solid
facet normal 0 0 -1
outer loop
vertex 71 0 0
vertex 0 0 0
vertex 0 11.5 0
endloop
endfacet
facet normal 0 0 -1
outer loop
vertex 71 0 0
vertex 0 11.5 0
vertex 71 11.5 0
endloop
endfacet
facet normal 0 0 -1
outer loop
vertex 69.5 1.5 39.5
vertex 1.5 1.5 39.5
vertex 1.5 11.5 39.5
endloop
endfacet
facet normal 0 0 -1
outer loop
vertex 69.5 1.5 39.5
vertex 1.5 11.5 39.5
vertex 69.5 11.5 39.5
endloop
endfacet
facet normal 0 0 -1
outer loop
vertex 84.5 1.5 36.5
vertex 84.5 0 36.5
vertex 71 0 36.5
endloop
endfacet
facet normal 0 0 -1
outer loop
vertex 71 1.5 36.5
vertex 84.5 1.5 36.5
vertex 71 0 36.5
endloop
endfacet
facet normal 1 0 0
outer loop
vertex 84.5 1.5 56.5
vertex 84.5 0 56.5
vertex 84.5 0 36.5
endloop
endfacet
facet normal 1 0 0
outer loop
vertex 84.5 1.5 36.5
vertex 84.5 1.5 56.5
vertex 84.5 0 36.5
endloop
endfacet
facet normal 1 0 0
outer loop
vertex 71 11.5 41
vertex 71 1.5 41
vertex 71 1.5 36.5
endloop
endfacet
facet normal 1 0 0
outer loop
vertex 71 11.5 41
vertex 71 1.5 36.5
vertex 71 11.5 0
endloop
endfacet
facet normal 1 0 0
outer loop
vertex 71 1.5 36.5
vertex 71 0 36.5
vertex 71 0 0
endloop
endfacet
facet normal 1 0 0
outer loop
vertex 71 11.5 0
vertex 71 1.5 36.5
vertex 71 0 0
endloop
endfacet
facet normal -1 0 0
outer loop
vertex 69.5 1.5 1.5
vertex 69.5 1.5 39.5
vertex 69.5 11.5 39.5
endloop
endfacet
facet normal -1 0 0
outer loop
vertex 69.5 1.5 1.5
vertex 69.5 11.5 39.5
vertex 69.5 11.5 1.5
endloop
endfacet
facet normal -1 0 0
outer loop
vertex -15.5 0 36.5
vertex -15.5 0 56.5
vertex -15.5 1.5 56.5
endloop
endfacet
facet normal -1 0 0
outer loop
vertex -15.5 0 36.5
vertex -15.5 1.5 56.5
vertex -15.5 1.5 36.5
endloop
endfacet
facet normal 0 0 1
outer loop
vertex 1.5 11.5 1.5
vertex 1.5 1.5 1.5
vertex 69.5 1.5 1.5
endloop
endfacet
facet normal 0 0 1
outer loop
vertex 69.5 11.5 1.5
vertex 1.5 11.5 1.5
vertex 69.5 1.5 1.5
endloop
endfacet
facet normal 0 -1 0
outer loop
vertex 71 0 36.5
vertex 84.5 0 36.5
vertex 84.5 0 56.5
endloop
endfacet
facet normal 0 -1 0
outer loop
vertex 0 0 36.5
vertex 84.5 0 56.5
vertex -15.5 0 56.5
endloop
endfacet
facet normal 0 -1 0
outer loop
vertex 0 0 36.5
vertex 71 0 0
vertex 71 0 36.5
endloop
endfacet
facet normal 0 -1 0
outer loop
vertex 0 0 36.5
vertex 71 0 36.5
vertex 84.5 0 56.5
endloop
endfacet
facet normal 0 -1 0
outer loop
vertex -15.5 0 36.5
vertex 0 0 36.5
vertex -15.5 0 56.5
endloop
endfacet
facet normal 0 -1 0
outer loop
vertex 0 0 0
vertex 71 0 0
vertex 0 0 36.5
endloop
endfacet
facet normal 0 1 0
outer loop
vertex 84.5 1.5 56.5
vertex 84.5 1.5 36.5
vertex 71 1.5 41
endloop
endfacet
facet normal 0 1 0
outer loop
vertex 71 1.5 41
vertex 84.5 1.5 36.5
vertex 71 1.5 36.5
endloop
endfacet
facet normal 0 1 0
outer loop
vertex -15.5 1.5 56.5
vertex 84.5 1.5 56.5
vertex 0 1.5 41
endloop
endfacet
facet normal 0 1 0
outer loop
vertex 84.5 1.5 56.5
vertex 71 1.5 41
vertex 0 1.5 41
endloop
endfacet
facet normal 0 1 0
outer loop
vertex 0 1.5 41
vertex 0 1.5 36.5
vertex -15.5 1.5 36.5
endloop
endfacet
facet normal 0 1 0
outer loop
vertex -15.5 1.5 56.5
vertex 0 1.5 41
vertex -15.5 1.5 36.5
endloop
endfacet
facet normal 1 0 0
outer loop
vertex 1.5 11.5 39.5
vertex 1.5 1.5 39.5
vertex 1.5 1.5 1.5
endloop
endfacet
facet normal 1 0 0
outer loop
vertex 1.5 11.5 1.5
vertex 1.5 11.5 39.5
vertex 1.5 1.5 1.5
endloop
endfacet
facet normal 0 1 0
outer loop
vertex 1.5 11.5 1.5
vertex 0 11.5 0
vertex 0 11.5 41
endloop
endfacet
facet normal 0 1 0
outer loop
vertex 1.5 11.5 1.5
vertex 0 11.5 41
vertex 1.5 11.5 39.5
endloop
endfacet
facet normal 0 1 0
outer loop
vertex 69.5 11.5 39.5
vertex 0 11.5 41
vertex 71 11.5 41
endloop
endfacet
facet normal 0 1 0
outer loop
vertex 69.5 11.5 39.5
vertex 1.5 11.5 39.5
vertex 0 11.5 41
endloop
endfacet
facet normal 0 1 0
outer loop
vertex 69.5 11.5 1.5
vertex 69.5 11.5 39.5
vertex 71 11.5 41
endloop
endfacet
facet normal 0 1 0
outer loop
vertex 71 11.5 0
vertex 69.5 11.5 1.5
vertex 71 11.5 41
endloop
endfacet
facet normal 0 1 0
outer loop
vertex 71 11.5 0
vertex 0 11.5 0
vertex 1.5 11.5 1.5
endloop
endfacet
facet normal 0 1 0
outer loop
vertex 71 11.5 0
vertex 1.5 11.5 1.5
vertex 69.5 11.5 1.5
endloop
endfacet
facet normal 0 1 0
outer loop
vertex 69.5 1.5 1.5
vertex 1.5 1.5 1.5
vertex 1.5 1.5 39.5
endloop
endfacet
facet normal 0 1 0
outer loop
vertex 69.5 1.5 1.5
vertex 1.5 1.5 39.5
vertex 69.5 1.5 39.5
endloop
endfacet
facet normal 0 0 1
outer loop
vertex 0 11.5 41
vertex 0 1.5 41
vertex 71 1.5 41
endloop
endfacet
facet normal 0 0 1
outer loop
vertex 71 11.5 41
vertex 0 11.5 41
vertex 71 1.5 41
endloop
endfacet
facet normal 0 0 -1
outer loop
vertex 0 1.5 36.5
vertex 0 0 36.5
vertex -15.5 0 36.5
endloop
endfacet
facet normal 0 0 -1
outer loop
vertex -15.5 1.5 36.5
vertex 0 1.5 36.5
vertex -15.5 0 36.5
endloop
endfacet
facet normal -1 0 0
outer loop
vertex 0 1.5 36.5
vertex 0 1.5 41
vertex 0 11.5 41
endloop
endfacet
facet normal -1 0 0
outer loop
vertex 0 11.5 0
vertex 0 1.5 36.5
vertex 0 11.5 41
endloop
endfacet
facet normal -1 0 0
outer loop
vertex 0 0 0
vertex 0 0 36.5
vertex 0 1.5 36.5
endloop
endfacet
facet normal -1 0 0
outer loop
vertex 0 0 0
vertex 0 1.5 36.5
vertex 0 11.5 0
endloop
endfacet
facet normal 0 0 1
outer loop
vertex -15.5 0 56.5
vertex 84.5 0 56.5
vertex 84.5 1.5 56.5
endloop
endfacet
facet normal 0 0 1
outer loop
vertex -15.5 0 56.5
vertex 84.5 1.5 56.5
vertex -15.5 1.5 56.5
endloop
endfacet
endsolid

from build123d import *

# Parameters (mm, degrees)
SKETCH_1_W      = 71
SKETCH_1_H      = 41
EXTRUDE_1_DEPTH = 1.5
SKETCH_2_W      = 71
SKETCH_2_H      = 41
SKETCH_2_W_2    = 68
SKETCH_2_H_2    = 38
EXTRUDE_2_DEPTH = 10
SKETCH_3_W      = 100
SKETCH_3_H      = 20
EXTRUDE_3_DEPTH = 1.5


with BuildPart() as part:
    # 草图1 → 凸台-拉伸1 (new body)
    with BuildSketch(Plane(origin=(0, 0, 0), x_dir=(1, 0, 0), z_dir=(0, 1, 0))):
        with Locations((35.5, -20.5)):
            Rectangle(SKETCH_1_W, SKETCH_1_H)
    extrude(amount=EXTRUDE_1_DEPTH)

    # 草图2 → 凸台-拉伸2 (add)
    with BuildSketch(Plane(origin=(0, 1.5, 0), x_dir=(1, 0, 0), z_dir=(0, 1, 0))):
        with Locations((35.5, -20.5)):
            Rectangle(SKETCH_2_W, SKETCH_2_H)
        with Locations((35.5, -20.5)):
            Rectangle(SKETCH_2_W_2, SKETCH_2_H_2, mode=Mode.SUBTRACT)
    extrude(amount=EXTRUDE_2_DEPTH)

    # 草图3 → 凸台-拉伸3 (add)
    with BuildSketch(Plane(origin=(0, 0, 0), x_dir=(-1, 0, 0), z_dir=(0, -1, 0))):
        with Locations((-34.5, -46.5)):
            Rectangle(SKETCH_3_W, SKETCH_3_H)
    extrude(amount=-EXTRUDE_3_DEPTH)


solid = part.part
